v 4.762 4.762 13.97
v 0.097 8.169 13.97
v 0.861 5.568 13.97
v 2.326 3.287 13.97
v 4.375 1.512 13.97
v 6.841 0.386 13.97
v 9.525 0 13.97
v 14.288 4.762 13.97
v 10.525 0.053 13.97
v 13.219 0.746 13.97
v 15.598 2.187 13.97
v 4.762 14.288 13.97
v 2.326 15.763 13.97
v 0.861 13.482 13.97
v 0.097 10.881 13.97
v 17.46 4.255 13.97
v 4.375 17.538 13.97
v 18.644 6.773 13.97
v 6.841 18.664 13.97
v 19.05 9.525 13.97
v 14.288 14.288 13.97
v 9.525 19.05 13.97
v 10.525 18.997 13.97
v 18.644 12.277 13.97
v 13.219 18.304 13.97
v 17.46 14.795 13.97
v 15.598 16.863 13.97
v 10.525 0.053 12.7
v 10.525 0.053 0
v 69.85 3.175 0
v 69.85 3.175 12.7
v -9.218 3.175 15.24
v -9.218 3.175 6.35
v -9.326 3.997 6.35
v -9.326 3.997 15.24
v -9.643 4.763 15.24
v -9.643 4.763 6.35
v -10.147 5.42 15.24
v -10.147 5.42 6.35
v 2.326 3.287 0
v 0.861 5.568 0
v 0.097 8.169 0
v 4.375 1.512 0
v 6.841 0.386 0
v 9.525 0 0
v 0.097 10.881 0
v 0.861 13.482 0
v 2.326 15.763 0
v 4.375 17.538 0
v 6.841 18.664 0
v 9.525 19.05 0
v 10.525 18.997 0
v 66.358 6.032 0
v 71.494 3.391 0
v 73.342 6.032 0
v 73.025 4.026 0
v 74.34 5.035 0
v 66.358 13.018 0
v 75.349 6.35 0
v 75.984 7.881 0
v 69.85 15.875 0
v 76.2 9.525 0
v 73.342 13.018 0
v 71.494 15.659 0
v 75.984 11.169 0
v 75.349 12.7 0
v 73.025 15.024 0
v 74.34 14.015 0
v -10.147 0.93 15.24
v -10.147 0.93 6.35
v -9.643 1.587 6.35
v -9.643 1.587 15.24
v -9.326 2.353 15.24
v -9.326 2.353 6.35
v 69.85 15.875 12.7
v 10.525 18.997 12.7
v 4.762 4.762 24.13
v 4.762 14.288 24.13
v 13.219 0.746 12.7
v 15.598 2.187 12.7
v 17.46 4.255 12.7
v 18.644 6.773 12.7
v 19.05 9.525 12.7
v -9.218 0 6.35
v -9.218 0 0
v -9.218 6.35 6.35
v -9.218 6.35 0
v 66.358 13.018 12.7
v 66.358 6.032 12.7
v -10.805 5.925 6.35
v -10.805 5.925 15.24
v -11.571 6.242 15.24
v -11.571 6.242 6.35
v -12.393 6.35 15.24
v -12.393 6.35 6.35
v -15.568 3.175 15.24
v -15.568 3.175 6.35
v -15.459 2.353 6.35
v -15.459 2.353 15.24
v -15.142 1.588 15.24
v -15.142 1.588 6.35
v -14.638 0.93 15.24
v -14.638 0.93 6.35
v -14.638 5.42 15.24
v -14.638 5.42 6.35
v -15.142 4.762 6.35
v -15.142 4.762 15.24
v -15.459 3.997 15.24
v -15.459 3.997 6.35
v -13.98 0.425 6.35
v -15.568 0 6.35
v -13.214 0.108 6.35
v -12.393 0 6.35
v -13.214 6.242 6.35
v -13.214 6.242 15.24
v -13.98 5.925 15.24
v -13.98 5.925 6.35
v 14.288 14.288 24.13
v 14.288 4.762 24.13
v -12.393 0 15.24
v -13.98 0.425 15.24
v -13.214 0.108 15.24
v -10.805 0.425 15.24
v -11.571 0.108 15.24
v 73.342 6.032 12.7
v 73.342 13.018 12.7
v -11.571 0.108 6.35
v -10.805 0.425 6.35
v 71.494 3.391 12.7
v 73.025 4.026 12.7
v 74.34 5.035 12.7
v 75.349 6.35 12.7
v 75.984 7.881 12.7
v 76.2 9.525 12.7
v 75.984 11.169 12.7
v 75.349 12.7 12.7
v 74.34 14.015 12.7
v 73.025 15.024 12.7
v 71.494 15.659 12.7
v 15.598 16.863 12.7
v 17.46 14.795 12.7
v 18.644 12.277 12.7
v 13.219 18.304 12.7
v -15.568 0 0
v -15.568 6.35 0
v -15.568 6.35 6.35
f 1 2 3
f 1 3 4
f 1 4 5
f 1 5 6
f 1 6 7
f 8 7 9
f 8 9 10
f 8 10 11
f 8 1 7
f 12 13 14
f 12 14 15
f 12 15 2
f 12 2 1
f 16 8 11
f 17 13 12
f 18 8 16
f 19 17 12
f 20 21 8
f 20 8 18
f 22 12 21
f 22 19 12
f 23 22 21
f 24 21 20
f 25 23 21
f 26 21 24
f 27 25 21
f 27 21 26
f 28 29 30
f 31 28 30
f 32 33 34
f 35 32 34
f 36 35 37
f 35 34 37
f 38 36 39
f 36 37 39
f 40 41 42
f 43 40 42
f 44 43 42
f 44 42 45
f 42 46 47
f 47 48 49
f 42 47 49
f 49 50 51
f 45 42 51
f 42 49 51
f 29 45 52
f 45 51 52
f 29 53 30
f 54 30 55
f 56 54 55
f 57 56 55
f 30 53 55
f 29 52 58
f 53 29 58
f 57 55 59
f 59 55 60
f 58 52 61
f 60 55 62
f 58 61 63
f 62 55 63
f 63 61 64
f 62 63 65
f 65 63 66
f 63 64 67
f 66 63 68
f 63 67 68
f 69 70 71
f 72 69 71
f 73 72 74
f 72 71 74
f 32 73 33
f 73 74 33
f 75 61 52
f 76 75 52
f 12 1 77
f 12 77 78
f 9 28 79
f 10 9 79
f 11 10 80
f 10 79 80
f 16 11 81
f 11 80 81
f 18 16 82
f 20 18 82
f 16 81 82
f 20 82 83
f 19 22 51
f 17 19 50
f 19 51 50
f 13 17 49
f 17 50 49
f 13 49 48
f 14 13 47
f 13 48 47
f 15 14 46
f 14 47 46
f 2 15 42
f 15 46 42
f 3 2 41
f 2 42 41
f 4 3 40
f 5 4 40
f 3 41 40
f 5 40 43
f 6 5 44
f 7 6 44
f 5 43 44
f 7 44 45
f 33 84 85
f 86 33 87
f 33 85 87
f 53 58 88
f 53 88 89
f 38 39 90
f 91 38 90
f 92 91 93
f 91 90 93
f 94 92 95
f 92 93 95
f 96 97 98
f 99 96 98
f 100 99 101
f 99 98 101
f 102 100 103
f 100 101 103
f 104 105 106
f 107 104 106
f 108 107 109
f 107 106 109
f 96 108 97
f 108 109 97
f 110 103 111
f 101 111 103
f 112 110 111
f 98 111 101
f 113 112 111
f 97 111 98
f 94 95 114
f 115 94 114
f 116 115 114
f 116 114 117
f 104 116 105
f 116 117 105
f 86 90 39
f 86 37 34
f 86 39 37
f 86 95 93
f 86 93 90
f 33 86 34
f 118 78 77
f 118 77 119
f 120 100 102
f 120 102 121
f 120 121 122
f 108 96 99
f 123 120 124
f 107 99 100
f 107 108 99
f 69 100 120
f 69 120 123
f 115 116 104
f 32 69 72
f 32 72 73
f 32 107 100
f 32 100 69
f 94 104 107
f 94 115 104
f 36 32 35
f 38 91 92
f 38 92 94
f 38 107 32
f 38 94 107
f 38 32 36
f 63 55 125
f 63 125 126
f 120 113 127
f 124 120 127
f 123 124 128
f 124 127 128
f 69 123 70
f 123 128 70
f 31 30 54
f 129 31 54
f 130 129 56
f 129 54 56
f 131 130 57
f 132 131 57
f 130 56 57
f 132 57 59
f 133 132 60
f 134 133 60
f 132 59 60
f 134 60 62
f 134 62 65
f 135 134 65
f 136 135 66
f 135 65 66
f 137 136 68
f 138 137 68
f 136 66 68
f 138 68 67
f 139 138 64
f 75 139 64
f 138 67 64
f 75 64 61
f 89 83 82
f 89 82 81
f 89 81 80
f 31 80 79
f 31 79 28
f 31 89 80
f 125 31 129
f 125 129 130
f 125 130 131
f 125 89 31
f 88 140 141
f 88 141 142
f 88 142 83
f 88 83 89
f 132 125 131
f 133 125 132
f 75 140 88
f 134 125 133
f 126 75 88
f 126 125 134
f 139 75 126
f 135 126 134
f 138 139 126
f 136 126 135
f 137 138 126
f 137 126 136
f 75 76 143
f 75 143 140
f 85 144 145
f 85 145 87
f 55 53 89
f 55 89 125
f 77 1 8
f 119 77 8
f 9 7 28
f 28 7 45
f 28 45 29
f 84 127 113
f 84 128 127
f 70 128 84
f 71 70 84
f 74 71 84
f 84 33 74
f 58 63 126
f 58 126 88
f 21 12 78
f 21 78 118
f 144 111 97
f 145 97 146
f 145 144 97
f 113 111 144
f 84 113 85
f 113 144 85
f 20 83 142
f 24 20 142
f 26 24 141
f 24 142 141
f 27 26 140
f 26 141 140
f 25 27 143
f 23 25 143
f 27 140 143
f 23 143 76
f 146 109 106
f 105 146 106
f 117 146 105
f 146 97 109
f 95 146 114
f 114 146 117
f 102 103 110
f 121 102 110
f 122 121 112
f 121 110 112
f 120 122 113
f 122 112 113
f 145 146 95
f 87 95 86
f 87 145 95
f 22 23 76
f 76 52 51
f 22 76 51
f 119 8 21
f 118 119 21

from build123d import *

# Parameters (mm, degrees)
F1_DEPTH  = 13.97
F2_DEPTH  = 12.7
F3_W      = 9.525
F3_H      = 9.525
F4_DEPTH  = 10.16
F6_DEPTH  = 24.131
F7_W      = 6.35
F7_H      = 6.35
F8_DEPTH  = 6.35
F11_DEPTH = 8.89


with BuildPart() as f1:
    # F0 (on Top) → F1 (new body)
    with BuildSketch(Plane.XY):
        with BuildLine():
            Line((10.524862, 18.997376), (9.525, 19.05))
            ThreePointArc((9.525, 19.05), (0, 9.525), (9.525, 0))
            Line((9.525, 0), (10.524862, 0.052624))
            ThreePointArc((10.524862, 0.052624), (16.604877, 3.153111), (19.05, 9.525))
            ThreePointArc((19.05, 9.525), (16.604877, 15.896889), (10.524862, 18.997376))
        make_face()
    extrude(amount=F1_DEPTH)

    # F0 (on Top) → F2 (join)
    with BuildSketch(Plane.XY):
        with BuildLine():
            Line((69.85, 15.875), (10.524862, 18.997376))
            ThreePointArc((10.524862, 18.997376), (16.604877, 15.896889), (19.05, 9.525))
            ThreePointArc((19.05, 9.525), (16.604877, 3.153111), (10.524862, 0.052624))
            Line((10.524862, 0.052624), (69.85, 3.175))
            Line((69.85, 3.175), (69.85, 9.525))
            Line((69.85, 9.525), (69.85, 15.875))
        make_face()
        with BuildLine():
            ThreePointArc((76.2, 9.525), (74.340128, 14.015128), (69.85, 15.875))
            Line((69.85, 15.875), (69.85, 9.525))
            Line((69.85, 9.525), (76.2, 9.525))
        make_face()
        with BuildLine():
            Line((69.85, 9.525), (69.85, 3.175))
            ThreePointArc((69.85, 3.175), (74.340128, 5.034872), (76.2, 9.525))
            Line((76.2, 9.525), (69.85, 9.525))
        make_face()
    extrude(amount=F2_DEPTH)

    # F3 (on face) → F4 (join)
    with BuildSketch(Plane.XY.offset(13.97)):
        with Locations((9.525, 9.525)):
            Rectangle(F3_W, F3_H)
    extrude(amount=F4_DEPTH)

    # F5 (on Top) → F6 (cut, through all)
    with BuildSketch(Plane.XY):
        Polygon((66.3575, 6.0325), (73.3425, 6.0325), (73.3425, 13.0175), (66.3575, 13.0175), (66.3575, 9.525), align=None)
    extrude(amount=F6_DEPTH, mode=Mode.SUBTRACT)


with BuildPart() as f8:
    # F7 (on Top) → F8 (new body)
    with BuildSketch(Plane.XY):
        with Locations((-12.392557, 3.175)):
            Rectangle(F7_W, F7_H)
    extrude(amount=F8_DEPTH)

    # F10 (on face) → F11 (join)
    with BuildSketch(Plane.XY.offset(6.35)):
        with BuildLine():
            ThreePointArc((-10.147493, 5.420064), (-11.177537, 6.108318), (-12.392557, 6.35))
            ThreePointArc((-12.392557, 6.35), (-13.607577, 6.108318), (-14.637621, 5.420064))
            ThreePointArc((-14.637621, 5.420064), (-15.325874, 4.39002), (-15.567557, 3.175))
            ThreePointArc((-15.567557, 3.175), (-15.325874, 1.95998), (-14.637621, 0.929936))
            ThreePointArc((-14.637621, 0.929936), (-13.607577, 0.241682), (-12.392557, 0))
            ThreePointArc((-12.392557, 0), (-11.177537, 0.241682), (-10.147493, 0.929936))
            ThreePointArc((-10.147493, 0.929936), (-9.459239, 1.95998), (-9.217557, 3.175))
            ThreePointArc((-9.217557, 3.175), (-9.459239, 4.39002), (-10.147493, 5.420064))
        make_face()
    extrude(amount=F11_DEPTH)


solid = Compound([f1.part, f8.part])
